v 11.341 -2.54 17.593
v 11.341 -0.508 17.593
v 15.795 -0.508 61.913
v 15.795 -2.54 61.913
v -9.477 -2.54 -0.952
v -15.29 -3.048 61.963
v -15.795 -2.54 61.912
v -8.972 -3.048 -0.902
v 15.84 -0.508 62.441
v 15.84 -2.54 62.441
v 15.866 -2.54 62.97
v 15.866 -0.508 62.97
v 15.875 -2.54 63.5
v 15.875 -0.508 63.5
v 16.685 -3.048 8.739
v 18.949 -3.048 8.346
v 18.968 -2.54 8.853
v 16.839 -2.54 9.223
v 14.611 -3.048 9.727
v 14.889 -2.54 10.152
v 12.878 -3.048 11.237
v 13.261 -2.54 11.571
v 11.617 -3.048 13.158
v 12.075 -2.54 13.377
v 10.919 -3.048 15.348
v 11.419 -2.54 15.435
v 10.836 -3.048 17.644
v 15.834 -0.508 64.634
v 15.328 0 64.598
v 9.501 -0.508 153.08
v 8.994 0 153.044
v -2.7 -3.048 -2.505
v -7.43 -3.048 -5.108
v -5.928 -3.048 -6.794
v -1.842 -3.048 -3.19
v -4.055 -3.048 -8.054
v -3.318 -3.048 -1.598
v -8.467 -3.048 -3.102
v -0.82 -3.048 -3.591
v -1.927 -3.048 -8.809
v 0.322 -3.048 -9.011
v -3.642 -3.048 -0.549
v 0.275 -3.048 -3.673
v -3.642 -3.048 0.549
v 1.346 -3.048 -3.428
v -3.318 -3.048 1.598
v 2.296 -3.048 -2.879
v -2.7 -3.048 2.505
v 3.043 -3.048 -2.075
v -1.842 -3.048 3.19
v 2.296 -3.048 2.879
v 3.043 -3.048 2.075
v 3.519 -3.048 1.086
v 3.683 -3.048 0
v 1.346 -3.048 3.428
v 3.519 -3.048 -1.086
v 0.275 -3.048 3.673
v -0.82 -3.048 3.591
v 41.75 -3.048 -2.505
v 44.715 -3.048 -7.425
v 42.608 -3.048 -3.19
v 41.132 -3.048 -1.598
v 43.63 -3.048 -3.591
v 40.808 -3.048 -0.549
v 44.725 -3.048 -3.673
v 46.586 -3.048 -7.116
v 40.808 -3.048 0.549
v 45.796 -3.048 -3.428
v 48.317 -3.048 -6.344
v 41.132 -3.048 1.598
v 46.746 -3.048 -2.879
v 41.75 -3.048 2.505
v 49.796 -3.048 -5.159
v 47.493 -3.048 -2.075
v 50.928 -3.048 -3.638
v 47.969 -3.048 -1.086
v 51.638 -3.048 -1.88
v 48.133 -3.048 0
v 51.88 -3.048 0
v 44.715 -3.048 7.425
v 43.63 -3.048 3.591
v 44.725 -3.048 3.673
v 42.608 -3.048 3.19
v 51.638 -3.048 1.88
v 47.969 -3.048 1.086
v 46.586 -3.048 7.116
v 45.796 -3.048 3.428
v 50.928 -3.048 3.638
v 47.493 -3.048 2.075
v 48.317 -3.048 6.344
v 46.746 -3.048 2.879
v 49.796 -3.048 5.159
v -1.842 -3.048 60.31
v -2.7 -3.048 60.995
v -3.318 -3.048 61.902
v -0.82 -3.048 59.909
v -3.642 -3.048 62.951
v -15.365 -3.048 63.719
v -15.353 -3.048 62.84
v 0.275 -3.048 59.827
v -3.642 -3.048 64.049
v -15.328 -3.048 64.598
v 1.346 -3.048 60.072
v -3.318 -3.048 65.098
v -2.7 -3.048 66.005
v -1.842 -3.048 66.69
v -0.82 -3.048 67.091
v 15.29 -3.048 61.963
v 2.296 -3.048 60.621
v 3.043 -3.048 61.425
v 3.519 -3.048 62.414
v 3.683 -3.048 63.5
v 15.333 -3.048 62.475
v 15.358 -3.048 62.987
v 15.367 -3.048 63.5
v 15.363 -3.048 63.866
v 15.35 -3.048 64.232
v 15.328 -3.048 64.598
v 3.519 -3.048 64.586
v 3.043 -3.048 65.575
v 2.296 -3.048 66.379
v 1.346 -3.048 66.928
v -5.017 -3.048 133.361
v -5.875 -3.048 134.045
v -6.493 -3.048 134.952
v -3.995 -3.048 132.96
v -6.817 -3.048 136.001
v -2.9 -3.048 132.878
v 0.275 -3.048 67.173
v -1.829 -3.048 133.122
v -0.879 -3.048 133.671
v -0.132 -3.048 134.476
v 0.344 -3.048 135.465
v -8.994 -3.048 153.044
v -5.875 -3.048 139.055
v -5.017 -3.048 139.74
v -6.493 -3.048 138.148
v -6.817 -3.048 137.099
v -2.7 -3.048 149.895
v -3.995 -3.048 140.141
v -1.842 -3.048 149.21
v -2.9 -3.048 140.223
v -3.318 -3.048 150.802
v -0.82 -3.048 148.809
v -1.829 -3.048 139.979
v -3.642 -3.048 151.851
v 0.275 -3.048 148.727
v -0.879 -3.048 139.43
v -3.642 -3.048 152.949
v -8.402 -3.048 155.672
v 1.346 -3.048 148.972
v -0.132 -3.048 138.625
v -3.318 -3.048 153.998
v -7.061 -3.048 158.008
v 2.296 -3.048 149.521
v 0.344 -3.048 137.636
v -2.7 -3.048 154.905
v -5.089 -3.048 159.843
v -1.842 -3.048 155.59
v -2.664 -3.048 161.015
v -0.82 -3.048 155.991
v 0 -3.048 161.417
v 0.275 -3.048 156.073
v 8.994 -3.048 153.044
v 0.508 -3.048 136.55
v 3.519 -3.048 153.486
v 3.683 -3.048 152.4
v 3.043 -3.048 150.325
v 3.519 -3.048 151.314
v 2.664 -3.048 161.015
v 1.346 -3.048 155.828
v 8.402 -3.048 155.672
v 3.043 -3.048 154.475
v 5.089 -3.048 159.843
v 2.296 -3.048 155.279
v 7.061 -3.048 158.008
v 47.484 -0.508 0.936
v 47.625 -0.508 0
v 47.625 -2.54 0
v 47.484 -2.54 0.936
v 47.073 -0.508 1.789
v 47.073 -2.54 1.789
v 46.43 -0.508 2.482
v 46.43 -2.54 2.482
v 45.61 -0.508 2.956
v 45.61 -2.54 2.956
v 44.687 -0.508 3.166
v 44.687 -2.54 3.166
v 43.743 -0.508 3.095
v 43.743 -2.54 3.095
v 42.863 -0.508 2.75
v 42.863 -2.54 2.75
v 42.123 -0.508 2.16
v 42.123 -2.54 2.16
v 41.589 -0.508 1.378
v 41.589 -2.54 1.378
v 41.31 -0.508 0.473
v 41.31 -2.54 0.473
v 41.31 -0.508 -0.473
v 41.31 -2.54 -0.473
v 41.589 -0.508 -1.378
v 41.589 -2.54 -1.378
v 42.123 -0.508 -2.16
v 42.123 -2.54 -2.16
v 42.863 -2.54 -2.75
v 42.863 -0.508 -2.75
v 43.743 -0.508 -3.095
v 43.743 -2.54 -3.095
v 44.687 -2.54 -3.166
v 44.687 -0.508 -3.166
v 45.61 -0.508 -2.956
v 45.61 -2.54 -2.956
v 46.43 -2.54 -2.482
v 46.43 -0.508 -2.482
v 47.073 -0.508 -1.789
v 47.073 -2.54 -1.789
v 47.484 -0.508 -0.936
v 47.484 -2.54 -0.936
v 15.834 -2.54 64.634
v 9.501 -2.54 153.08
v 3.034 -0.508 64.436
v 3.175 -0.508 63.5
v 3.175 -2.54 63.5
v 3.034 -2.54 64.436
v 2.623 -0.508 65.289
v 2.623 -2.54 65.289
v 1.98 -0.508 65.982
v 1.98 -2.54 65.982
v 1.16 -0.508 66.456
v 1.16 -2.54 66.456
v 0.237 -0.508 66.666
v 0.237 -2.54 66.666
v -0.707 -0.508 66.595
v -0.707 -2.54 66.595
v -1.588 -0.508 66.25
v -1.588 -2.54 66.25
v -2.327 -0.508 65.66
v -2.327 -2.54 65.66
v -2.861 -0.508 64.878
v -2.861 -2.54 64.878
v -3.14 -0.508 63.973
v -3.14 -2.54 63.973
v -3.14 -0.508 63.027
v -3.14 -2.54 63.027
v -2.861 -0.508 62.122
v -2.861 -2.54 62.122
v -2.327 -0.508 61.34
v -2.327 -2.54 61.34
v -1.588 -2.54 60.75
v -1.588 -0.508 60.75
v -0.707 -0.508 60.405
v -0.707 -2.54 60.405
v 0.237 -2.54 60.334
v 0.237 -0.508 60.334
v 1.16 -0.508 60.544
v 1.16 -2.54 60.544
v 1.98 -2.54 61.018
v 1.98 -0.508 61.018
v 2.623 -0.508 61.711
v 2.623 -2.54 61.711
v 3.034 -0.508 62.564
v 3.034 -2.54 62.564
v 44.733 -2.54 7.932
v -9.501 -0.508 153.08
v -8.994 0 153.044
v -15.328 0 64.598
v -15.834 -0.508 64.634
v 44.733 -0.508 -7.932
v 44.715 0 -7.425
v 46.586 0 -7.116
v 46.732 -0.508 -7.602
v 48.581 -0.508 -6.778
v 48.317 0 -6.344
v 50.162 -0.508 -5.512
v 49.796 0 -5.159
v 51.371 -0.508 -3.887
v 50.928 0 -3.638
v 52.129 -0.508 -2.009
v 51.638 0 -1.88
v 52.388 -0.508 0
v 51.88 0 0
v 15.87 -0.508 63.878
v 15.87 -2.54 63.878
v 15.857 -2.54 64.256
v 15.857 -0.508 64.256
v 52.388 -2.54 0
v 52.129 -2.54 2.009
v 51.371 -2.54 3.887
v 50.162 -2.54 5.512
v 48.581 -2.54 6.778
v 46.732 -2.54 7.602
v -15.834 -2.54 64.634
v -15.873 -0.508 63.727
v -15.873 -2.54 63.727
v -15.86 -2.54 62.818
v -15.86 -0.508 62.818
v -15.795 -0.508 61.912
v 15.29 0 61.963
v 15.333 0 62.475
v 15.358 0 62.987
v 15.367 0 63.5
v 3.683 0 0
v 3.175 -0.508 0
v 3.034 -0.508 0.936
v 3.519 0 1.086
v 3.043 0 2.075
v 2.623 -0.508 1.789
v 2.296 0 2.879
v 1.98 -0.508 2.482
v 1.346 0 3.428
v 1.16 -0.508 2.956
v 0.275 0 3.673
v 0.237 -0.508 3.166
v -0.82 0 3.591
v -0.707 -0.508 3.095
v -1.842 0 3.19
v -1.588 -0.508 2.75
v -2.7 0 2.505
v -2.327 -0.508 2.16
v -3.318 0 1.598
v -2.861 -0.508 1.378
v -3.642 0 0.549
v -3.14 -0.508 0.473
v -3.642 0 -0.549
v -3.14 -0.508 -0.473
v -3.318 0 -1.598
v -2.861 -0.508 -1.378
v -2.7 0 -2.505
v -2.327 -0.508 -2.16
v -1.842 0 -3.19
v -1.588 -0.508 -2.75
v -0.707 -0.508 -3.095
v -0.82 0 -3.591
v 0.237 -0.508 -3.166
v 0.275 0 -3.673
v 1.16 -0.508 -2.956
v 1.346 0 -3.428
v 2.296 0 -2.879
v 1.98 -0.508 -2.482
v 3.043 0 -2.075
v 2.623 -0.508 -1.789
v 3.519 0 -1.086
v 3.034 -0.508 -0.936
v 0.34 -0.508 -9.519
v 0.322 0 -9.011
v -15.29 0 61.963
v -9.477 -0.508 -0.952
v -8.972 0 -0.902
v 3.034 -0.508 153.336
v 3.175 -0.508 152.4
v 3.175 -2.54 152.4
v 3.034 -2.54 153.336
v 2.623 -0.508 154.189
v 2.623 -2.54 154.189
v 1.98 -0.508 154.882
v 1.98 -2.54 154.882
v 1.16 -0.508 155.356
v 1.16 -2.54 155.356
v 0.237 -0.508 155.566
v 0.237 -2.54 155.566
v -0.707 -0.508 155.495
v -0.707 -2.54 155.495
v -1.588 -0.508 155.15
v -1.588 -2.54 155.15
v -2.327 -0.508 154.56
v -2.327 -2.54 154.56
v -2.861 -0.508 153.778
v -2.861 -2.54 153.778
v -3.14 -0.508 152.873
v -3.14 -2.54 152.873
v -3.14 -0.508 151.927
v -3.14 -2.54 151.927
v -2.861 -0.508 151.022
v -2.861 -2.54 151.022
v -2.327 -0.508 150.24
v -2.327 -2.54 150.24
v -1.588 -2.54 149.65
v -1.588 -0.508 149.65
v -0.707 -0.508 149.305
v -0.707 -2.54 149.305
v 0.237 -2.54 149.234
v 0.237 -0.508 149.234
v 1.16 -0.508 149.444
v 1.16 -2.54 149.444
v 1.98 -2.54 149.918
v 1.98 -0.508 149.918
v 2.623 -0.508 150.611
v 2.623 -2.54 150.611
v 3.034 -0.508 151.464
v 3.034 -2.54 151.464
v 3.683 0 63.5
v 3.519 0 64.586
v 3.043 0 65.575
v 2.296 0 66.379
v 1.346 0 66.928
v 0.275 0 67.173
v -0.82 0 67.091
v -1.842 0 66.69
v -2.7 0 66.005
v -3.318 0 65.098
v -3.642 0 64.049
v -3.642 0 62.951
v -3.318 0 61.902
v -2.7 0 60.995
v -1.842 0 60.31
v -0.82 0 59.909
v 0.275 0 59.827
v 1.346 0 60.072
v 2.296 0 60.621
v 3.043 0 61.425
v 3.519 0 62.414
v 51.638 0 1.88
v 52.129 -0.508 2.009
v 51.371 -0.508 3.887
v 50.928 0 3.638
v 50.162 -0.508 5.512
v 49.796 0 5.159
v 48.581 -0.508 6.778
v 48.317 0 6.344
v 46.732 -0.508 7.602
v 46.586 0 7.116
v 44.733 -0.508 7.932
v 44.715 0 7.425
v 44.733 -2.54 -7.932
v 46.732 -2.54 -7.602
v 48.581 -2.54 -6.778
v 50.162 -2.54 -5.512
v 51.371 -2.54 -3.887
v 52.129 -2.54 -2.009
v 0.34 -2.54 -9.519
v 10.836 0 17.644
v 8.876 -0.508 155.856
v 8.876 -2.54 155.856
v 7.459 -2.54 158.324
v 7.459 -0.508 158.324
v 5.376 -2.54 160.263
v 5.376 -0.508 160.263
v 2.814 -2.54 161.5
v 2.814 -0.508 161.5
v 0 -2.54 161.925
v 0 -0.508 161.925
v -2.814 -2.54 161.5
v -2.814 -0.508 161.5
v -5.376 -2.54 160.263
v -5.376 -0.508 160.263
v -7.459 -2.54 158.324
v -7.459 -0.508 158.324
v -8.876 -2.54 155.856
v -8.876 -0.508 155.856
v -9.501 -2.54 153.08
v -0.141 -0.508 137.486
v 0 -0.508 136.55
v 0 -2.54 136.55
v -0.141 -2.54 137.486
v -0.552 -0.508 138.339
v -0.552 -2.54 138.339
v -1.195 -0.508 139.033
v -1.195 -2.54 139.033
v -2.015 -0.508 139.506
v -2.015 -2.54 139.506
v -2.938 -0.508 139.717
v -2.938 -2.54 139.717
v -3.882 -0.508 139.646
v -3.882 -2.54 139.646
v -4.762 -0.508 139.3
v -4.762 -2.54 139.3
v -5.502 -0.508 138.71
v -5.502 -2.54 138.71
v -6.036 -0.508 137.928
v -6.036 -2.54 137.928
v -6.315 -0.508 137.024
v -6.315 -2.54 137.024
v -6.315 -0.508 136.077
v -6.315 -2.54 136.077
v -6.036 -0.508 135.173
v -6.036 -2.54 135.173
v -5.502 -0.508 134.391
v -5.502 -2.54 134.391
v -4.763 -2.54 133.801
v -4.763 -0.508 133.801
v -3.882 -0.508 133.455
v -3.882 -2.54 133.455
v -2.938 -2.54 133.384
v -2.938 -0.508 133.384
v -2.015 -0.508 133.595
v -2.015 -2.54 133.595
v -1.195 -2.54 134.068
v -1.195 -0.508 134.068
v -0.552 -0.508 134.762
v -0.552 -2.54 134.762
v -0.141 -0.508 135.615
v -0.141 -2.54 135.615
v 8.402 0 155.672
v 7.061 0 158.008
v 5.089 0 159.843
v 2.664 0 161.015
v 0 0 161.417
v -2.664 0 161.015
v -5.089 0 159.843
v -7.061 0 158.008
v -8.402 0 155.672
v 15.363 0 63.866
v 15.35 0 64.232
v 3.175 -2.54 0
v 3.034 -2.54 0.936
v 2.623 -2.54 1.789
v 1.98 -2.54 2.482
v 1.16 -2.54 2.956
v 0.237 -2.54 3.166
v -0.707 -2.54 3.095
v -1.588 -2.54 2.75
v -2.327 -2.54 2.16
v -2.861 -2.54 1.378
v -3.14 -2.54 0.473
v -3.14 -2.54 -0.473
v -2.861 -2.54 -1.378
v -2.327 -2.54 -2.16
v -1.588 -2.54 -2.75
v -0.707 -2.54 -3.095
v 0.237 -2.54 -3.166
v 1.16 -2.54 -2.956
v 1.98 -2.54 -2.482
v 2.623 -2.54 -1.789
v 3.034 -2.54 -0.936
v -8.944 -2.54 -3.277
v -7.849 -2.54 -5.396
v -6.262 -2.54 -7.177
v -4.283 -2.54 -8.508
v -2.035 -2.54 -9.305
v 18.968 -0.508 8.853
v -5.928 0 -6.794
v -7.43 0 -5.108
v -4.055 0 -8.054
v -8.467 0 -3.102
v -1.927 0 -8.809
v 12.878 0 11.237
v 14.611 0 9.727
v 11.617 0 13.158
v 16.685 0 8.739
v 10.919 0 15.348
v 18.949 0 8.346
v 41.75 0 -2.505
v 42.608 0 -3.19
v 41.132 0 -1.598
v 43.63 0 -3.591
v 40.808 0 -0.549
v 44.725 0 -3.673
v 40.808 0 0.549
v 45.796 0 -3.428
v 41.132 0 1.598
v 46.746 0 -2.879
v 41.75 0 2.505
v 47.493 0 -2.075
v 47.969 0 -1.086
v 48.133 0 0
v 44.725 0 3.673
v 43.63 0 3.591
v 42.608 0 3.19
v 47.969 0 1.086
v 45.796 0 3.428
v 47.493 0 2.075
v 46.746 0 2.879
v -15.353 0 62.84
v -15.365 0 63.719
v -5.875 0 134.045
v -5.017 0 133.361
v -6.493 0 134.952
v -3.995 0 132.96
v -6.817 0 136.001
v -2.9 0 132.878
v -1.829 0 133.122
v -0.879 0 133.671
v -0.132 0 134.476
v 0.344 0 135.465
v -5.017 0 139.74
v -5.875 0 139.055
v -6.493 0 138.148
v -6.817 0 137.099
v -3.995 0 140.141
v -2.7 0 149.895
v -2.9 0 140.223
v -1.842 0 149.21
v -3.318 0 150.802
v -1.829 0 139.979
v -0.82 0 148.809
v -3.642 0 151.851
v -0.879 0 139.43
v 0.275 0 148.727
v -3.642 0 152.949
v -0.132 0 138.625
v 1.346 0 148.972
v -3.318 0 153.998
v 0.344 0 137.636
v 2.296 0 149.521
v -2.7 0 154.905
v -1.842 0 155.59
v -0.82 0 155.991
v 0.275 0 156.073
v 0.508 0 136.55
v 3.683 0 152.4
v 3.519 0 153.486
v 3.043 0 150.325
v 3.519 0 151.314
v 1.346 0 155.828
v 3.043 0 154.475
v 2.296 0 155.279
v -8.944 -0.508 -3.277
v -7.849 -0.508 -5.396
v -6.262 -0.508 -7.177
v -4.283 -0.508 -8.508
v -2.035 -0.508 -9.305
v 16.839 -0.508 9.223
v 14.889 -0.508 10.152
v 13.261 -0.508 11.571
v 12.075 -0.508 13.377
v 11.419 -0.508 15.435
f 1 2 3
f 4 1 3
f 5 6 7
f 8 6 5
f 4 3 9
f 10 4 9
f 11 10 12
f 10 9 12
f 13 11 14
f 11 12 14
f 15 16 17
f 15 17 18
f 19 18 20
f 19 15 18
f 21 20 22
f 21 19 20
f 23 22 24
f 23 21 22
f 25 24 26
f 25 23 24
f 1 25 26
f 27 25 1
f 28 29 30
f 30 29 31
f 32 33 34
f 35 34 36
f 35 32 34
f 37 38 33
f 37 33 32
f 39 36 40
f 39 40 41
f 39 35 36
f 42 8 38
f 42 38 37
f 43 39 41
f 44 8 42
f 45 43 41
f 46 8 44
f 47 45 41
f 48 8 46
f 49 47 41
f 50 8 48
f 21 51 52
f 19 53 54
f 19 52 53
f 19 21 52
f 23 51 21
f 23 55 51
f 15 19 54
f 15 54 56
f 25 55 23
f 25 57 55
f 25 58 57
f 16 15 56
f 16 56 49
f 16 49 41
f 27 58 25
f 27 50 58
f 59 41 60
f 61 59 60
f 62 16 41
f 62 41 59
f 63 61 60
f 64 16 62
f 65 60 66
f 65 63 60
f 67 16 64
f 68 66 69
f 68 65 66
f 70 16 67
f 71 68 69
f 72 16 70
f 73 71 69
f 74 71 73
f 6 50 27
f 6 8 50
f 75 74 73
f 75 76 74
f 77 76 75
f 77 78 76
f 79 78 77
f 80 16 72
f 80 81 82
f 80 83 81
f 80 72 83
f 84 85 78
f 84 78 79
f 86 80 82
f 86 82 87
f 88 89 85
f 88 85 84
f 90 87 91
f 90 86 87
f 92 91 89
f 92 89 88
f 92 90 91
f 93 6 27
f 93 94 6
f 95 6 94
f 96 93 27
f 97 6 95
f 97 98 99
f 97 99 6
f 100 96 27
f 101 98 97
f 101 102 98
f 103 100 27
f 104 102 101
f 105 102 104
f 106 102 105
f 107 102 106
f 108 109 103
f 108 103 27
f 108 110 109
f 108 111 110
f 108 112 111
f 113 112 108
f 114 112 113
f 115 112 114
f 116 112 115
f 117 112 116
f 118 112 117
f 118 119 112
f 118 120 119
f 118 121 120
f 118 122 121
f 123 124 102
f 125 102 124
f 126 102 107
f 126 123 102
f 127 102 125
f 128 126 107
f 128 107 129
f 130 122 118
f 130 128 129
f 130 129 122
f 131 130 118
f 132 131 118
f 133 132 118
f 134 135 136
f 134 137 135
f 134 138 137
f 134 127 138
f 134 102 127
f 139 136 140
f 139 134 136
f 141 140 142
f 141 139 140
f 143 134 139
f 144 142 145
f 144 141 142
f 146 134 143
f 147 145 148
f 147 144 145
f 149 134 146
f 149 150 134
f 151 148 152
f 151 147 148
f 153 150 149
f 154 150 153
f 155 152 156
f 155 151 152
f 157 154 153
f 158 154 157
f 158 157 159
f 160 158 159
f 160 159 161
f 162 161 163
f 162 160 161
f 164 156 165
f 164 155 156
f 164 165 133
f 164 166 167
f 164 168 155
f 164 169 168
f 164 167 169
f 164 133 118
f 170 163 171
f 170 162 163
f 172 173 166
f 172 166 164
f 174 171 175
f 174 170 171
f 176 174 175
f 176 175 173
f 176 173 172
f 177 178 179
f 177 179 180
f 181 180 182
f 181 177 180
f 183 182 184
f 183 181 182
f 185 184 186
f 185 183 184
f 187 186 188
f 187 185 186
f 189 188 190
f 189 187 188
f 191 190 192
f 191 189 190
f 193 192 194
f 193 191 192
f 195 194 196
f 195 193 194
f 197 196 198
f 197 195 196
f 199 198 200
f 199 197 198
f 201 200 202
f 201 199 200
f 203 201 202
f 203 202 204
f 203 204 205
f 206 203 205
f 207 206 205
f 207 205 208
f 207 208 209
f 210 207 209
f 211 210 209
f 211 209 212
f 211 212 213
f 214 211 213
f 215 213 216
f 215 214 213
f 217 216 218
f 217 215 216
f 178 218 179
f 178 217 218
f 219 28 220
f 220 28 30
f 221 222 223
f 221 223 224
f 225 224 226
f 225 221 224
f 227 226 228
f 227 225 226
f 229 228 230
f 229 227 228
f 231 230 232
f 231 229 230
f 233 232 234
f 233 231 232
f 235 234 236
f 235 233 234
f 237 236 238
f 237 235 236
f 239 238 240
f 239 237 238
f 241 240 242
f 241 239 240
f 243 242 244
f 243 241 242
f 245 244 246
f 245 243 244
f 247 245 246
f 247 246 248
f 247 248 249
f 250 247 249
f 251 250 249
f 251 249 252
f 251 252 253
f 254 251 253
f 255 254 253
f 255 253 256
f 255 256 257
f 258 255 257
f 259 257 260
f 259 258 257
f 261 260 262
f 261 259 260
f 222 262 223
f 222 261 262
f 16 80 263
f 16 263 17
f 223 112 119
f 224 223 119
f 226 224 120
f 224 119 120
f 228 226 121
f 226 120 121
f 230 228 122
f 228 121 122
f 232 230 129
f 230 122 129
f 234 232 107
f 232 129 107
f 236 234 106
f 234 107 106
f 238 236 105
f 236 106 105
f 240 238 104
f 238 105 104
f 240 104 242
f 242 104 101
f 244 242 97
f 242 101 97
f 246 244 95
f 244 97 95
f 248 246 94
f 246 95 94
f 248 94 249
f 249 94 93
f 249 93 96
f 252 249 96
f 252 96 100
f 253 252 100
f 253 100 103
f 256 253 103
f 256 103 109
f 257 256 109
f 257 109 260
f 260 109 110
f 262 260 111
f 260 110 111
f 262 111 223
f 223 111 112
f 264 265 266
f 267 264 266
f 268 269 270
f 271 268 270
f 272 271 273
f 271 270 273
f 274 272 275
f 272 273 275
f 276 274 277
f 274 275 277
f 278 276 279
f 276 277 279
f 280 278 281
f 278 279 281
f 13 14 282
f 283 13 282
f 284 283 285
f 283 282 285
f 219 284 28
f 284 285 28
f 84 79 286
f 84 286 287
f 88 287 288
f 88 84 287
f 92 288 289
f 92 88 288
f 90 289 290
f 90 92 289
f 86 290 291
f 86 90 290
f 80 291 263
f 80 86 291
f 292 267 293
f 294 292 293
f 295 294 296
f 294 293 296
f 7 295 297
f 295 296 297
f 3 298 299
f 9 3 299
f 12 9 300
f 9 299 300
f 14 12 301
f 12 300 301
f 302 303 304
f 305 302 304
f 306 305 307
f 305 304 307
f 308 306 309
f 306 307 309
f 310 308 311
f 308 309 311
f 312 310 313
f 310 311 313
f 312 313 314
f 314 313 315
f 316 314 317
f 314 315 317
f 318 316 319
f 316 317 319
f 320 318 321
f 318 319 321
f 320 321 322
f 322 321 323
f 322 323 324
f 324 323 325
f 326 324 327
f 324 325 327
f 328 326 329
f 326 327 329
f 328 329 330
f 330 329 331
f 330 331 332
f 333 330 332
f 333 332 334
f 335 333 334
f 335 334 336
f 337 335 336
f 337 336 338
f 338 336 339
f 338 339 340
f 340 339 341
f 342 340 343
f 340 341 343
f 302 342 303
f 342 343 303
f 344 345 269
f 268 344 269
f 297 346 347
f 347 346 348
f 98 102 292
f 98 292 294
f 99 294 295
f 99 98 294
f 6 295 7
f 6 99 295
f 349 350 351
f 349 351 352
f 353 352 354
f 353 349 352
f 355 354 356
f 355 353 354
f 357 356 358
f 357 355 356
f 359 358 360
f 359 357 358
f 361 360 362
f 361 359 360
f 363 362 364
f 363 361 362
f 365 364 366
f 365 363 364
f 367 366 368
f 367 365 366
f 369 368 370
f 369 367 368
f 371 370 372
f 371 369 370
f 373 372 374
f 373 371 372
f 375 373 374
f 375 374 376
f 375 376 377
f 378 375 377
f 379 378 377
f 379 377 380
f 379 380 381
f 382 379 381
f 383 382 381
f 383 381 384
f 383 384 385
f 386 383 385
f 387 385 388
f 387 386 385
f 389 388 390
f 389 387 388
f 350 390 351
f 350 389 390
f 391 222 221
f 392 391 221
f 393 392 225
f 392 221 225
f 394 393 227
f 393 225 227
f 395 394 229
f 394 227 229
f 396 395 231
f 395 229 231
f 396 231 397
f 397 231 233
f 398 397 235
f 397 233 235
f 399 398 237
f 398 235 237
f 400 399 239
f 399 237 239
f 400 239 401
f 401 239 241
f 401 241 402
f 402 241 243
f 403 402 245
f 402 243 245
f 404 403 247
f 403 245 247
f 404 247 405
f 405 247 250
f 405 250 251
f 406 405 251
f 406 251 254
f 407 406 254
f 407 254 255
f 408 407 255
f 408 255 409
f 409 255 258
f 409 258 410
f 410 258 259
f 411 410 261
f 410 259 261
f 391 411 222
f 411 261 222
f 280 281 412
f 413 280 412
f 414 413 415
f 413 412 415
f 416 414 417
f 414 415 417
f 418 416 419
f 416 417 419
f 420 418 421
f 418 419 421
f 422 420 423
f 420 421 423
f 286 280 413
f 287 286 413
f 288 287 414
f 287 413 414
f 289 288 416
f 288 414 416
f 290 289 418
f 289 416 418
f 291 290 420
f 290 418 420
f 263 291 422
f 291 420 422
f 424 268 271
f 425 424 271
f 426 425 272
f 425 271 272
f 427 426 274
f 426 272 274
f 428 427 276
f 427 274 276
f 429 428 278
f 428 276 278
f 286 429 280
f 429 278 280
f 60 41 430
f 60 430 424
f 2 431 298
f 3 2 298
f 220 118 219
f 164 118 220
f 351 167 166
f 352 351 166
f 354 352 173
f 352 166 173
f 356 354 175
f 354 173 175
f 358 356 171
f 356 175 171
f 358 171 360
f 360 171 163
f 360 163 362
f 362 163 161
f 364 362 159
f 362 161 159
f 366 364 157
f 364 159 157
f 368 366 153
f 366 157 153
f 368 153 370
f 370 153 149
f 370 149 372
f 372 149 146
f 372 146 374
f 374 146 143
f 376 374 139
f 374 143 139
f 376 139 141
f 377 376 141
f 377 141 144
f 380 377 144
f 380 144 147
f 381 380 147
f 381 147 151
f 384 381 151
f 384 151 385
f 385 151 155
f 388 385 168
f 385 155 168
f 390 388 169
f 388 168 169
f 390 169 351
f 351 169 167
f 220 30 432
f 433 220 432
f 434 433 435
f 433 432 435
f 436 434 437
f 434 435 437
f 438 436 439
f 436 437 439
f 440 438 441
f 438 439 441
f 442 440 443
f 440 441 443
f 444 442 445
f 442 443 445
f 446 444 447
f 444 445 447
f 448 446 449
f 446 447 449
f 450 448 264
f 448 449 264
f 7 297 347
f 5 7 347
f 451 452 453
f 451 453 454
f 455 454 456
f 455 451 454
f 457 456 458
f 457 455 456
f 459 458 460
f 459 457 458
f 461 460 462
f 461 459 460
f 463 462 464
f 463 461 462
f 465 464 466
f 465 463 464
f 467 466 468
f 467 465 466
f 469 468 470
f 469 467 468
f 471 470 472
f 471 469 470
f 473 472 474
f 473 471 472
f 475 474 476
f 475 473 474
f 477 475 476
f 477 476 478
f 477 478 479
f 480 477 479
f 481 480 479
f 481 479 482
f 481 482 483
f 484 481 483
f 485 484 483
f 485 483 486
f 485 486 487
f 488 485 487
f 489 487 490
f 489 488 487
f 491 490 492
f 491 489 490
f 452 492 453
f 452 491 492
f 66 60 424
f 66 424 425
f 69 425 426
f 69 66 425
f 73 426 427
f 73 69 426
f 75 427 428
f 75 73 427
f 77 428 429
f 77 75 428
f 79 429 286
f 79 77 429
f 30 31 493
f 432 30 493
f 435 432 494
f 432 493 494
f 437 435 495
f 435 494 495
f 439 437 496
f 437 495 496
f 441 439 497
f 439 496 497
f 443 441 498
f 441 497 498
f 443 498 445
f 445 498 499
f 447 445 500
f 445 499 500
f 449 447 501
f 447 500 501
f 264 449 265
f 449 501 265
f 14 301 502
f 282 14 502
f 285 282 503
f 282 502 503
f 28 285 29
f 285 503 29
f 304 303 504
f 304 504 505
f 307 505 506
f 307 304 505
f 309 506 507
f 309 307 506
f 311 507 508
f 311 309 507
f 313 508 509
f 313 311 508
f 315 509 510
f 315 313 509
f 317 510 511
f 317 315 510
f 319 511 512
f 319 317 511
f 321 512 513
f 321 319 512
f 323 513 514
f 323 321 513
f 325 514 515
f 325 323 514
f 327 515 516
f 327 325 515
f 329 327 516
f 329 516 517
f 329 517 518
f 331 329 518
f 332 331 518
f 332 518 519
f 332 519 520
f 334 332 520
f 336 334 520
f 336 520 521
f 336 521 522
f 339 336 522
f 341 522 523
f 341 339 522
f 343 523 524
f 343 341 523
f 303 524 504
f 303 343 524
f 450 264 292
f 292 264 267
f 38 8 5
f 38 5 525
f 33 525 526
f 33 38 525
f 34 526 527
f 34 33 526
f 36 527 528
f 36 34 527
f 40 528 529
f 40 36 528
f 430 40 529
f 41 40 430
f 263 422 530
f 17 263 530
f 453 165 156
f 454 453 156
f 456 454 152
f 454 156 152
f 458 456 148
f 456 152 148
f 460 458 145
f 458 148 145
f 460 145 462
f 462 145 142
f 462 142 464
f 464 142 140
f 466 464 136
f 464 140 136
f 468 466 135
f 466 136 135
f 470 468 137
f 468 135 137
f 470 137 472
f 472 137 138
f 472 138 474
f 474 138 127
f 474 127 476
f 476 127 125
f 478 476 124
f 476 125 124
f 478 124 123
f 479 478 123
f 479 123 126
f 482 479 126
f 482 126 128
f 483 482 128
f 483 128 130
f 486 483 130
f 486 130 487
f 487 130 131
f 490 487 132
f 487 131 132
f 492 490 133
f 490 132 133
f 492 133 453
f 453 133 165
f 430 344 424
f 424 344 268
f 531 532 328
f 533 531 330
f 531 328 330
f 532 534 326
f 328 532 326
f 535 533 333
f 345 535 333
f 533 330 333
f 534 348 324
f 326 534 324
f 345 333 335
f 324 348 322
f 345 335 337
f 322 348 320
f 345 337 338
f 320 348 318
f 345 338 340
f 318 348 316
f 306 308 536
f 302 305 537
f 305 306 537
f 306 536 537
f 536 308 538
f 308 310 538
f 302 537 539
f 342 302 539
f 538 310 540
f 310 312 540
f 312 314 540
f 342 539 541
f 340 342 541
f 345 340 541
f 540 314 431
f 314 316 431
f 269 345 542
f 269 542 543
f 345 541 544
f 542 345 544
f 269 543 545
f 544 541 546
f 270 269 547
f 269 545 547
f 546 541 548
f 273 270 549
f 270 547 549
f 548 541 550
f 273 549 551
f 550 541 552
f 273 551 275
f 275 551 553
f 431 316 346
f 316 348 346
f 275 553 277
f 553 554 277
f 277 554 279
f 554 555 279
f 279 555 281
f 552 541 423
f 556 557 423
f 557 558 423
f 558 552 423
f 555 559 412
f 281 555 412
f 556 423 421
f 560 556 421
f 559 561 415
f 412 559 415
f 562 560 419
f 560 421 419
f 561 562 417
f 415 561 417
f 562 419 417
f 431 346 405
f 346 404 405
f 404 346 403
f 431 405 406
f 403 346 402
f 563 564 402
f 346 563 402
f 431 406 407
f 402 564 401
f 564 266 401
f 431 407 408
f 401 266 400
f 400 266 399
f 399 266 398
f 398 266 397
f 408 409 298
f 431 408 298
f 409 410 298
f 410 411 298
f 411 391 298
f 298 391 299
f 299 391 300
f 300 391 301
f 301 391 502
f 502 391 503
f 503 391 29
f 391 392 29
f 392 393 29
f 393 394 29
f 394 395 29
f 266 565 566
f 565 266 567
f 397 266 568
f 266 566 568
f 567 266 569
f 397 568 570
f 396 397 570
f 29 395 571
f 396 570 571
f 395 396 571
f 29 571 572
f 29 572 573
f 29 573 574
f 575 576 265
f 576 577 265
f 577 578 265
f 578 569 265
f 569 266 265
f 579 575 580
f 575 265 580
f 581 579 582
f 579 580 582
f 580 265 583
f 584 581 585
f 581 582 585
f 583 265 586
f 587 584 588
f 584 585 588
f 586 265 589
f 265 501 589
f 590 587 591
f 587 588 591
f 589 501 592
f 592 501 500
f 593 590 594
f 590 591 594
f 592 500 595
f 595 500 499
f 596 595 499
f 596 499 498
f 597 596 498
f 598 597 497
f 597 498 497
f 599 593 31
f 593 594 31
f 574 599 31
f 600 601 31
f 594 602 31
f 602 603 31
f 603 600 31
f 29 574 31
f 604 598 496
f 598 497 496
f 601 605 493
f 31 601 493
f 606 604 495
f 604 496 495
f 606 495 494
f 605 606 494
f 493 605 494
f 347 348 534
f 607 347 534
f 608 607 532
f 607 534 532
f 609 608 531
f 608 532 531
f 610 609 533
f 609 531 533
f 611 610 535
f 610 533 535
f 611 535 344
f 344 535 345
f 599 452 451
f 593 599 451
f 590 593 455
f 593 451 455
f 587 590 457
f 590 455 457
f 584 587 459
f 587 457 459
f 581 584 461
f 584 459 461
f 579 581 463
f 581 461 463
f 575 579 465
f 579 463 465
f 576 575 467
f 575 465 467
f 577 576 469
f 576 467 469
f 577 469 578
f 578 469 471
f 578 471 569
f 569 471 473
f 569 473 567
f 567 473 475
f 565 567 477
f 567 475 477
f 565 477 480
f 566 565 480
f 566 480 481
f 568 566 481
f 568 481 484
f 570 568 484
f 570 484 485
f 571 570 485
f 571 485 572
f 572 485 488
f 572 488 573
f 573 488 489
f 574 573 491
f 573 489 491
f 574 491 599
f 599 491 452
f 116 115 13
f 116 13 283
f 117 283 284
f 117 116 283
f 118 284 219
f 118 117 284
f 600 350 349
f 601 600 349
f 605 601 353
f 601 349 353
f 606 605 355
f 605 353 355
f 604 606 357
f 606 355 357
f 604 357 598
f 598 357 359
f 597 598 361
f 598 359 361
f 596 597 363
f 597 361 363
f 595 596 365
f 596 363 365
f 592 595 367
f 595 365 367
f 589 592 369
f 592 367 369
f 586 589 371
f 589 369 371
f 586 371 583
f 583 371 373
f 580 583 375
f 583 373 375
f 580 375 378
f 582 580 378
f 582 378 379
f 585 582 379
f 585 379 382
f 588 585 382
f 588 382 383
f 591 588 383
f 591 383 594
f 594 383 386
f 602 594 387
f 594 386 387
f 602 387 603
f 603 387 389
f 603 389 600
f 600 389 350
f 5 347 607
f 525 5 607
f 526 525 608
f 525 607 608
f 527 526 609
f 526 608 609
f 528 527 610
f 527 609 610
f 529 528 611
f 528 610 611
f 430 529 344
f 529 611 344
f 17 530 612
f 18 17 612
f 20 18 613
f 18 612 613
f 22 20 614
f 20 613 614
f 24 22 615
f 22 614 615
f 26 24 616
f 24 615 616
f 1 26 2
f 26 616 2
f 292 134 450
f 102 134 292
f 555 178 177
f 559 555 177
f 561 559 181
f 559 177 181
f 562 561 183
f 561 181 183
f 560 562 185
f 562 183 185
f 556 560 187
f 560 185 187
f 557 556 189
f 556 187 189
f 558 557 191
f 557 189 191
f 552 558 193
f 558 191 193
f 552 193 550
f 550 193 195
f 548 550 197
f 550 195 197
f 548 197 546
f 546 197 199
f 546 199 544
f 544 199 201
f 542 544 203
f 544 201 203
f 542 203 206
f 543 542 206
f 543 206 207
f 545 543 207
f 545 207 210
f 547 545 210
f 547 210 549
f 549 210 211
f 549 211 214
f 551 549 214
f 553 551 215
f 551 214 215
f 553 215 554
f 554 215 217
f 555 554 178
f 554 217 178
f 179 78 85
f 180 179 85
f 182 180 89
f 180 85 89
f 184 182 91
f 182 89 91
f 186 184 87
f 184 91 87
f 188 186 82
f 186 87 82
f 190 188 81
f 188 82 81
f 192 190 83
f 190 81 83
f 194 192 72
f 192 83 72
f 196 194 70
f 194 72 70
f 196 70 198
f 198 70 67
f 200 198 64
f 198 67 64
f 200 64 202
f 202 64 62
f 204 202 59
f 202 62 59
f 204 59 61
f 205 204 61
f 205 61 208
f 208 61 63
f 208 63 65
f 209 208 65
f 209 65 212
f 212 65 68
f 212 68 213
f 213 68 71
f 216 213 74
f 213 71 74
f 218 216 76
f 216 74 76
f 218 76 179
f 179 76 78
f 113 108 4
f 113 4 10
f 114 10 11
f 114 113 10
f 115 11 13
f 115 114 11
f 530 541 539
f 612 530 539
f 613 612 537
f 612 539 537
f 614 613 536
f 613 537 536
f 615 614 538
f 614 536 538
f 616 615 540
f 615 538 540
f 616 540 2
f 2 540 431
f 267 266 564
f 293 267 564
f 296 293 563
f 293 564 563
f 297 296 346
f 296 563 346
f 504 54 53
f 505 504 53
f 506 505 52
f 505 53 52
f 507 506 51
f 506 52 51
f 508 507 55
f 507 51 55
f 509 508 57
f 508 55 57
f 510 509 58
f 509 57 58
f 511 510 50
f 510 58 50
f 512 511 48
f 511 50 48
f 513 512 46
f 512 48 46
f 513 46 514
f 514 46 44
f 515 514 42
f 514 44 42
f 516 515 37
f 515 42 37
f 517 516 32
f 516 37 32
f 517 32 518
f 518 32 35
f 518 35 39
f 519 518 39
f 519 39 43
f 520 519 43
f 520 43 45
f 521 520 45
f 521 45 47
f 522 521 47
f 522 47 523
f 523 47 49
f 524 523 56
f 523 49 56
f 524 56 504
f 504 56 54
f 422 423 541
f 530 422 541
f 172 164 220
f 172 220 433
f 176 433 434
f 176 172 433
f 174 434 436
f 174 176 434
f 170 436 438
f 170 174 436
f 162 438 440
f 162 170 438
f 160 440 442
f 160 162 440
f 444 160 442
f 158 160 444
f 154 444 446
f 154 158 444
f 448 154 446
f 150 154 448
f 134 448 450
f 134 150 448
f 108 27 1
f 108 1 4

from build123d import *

# Parameters (mm, degrees)
F0_R     = 3.175
F1_DEPTH = 3.048
F2_SIZE  = 0.508
F3_SIZE  = 0.508


with BuildPart() as f1:
    # F0 (on Front) → F1 (new body)
    with BuildSketch(Plane.XZ):
        with BuildLine():
            ThreePointArc((0.340179, -9.518923), (6.854408, -6.613827), (9.525, 0))
            ThreePointArc((9.525, 0), (-0.476848, 9.513056), (-9.477255, -0.9525))
            ThreePointArc((-9.477255, -0.9525), (-6.262383, -7.17692), (0.340179, -9.518923))
        make_face()
        Circle(F0_R, mode=Mode.SUBTRACT)
        with BuildLine():
            ThreePointArc((9.50067, 153.080357), (0, 161.925), (-9.50067, 153.080357))
            ThreePointArc((-9.50067, 153.080357), (-0.340396, 142.881084), (9.525, 152.4))
            ThreePointArc((9.525, 152.4), (9.518916, 152.740396), (9.50067, 153.080357))
        make_face()
        with Locations((0, 152.4)):
            Circle(F0_R, mode=Mode.SUBTRACT)
        with BuildLine():
            ThreePointArc((44.733482, 7.932436), (36.5125, 0), (44.733482, -7.932436))
            ThreePointArc((44.733482, -7.932436), (50.162007, -5.511523), (52.3875, 0))
            ThreePointArc((52.3875, 0), (50.162007, 5.511523), (44.733482, 7.932436))
        make_face()
        with Locations((44.45, 0)):
            Circle(F0_R, mode=Mode.SUBTRACT)
        with BuildLine():
            ThreePointArc((-9.477255, -0.9525), (-0.476848, 9.513056), (9.525, 0))
            ThreePointArc((9.525, 0), (6.854408, -6.613827), (0.340179, -9.518923))
            Line((0.340179, -9.518923), (44.733482, -7.932436))
            ThreePointArc((44.733482, -7.932436), (36.5125, 0), (44.733482, 7.932436))
            Line((44.733482, 7.932436), (18.9676, 8.853234))
            ThreePointArc((18.9676, 8.853234), (13.2612, 11.571359), (11.341187, 17.593382))
            Line((11.341187, 17.593382), (15.795426, 61.9125))
            ThreePointArc((15.795426, 61.9125), (0, 47.625), (-15.795426, 61.9125))
            Line((-15.795426, 61.9125), (-9.477255, -0.9525))
        make_face()
        with BuildLine():
            ThreePointArc((-15.834451, 64.633929), (-15.873368, 63.272376), (-15.795426, 61.9125))
            ThreePointArc((-15.795426, 61.9125), (0, 47.625), (15.795426, 61.9125))
            ThreePointArc((15.795426, 61.9125), (15.855094, 62.705253), (15.875, 63.5))
            ThreePointArc((15.875, 63.5), (15.864859, 64.067327), (15.834451, 64.633929))
            ThreePointArc((15.834451, 64.633929), (0, 79.375), (-15.834451, 64.633929))
        make_face()
        with Locations((0, 63.5)):
            Circle(F0_R, mode=Mode.SUBTRACT)
        with BuildLine():
            Line((-9.50067, 153.080357), (-15.834451, 64.633929))
            ThreePointArc((-15.834451, 64.633929), (0, 79.375), (15.834451, 64.633929))
            Line((15.834451, 64.633929), (9.50067, 153.080357))
            ThreePointArc((9.50067, 153.080357), (9.518916, 152.740396), (9.525, 152.4))
            ThreePointArc((9.525, 152.4), (-0.340396, 142.881084), (-9.50067, 153.080357))
        make_face()
        with Locations((-3.175, 136.5504)):
            Circle(F0_R, mode=Mode.SUBTRACT)
    extrude(amount=F1_DEPTH)

    # F2
    f2_edges = [f1.edges().sort_by_distance(p)[0] for p in [
        (-6.262383, -3.048, -7.17692),
        (22.53683, -3.048, -8.72568),
        (52.3875, -3.048, 0),
        (31.850541, -3.048, 8.392835),
        (13.2612, -3.048, 11.571359),
        (13.568306, -3.048, 39.752941),
        (15.873368, -3.048, 63.272376),
        (12.667561, -3.048, 108.857143),
        (0, -3.048, 161.925),
        (-12.667561, -3.048, 108.857143),
        (-15.873368, -3.048, 63.272376),
        (-12.63634, -3.048, 30.48),
        (-3.175, -3.048, 0),
        (41.275, -3.048, 0),
        (-3.175, -3.048, 63.5),
        (-6.35, -3.048, 136.5504),
        (-3.175, -3.048, 152.4),
    ]]
    chamfer(f2_edges, length=F2_SIZE)

    # F3
    f3_edges = [f1.edges().sort_by_distance(p)[0] for p in [
        (-6.262383, 0, -7.17692),
        (22.53683, 0, -8.72568),
        (52.3875, 0, 0),
        (31.850541, 0, 8.392835),
        (13.2612, 0, 11.571359),
        (13.568306, 0, 39.752941),
        (15.873368, 0, 63.272376),
        (12.667561, 0, 108.857143),
        (0, 0, 161.925),
        (-12.667561, 0, 108.857143),
        (-15.873368, 0, 63.272376),
        (-12.63634, 0, 30.48),
        (-3.175, 0, 0),
        (41.275, 0, 0),
        (-3.175, 0, 63.5),
        (-6.35, 0, 136.5504),
        (-3.175, 0, 152.4),
    ]]
    chamfer(f3_edges, length=F3_SIZE)


solid = f1.part
